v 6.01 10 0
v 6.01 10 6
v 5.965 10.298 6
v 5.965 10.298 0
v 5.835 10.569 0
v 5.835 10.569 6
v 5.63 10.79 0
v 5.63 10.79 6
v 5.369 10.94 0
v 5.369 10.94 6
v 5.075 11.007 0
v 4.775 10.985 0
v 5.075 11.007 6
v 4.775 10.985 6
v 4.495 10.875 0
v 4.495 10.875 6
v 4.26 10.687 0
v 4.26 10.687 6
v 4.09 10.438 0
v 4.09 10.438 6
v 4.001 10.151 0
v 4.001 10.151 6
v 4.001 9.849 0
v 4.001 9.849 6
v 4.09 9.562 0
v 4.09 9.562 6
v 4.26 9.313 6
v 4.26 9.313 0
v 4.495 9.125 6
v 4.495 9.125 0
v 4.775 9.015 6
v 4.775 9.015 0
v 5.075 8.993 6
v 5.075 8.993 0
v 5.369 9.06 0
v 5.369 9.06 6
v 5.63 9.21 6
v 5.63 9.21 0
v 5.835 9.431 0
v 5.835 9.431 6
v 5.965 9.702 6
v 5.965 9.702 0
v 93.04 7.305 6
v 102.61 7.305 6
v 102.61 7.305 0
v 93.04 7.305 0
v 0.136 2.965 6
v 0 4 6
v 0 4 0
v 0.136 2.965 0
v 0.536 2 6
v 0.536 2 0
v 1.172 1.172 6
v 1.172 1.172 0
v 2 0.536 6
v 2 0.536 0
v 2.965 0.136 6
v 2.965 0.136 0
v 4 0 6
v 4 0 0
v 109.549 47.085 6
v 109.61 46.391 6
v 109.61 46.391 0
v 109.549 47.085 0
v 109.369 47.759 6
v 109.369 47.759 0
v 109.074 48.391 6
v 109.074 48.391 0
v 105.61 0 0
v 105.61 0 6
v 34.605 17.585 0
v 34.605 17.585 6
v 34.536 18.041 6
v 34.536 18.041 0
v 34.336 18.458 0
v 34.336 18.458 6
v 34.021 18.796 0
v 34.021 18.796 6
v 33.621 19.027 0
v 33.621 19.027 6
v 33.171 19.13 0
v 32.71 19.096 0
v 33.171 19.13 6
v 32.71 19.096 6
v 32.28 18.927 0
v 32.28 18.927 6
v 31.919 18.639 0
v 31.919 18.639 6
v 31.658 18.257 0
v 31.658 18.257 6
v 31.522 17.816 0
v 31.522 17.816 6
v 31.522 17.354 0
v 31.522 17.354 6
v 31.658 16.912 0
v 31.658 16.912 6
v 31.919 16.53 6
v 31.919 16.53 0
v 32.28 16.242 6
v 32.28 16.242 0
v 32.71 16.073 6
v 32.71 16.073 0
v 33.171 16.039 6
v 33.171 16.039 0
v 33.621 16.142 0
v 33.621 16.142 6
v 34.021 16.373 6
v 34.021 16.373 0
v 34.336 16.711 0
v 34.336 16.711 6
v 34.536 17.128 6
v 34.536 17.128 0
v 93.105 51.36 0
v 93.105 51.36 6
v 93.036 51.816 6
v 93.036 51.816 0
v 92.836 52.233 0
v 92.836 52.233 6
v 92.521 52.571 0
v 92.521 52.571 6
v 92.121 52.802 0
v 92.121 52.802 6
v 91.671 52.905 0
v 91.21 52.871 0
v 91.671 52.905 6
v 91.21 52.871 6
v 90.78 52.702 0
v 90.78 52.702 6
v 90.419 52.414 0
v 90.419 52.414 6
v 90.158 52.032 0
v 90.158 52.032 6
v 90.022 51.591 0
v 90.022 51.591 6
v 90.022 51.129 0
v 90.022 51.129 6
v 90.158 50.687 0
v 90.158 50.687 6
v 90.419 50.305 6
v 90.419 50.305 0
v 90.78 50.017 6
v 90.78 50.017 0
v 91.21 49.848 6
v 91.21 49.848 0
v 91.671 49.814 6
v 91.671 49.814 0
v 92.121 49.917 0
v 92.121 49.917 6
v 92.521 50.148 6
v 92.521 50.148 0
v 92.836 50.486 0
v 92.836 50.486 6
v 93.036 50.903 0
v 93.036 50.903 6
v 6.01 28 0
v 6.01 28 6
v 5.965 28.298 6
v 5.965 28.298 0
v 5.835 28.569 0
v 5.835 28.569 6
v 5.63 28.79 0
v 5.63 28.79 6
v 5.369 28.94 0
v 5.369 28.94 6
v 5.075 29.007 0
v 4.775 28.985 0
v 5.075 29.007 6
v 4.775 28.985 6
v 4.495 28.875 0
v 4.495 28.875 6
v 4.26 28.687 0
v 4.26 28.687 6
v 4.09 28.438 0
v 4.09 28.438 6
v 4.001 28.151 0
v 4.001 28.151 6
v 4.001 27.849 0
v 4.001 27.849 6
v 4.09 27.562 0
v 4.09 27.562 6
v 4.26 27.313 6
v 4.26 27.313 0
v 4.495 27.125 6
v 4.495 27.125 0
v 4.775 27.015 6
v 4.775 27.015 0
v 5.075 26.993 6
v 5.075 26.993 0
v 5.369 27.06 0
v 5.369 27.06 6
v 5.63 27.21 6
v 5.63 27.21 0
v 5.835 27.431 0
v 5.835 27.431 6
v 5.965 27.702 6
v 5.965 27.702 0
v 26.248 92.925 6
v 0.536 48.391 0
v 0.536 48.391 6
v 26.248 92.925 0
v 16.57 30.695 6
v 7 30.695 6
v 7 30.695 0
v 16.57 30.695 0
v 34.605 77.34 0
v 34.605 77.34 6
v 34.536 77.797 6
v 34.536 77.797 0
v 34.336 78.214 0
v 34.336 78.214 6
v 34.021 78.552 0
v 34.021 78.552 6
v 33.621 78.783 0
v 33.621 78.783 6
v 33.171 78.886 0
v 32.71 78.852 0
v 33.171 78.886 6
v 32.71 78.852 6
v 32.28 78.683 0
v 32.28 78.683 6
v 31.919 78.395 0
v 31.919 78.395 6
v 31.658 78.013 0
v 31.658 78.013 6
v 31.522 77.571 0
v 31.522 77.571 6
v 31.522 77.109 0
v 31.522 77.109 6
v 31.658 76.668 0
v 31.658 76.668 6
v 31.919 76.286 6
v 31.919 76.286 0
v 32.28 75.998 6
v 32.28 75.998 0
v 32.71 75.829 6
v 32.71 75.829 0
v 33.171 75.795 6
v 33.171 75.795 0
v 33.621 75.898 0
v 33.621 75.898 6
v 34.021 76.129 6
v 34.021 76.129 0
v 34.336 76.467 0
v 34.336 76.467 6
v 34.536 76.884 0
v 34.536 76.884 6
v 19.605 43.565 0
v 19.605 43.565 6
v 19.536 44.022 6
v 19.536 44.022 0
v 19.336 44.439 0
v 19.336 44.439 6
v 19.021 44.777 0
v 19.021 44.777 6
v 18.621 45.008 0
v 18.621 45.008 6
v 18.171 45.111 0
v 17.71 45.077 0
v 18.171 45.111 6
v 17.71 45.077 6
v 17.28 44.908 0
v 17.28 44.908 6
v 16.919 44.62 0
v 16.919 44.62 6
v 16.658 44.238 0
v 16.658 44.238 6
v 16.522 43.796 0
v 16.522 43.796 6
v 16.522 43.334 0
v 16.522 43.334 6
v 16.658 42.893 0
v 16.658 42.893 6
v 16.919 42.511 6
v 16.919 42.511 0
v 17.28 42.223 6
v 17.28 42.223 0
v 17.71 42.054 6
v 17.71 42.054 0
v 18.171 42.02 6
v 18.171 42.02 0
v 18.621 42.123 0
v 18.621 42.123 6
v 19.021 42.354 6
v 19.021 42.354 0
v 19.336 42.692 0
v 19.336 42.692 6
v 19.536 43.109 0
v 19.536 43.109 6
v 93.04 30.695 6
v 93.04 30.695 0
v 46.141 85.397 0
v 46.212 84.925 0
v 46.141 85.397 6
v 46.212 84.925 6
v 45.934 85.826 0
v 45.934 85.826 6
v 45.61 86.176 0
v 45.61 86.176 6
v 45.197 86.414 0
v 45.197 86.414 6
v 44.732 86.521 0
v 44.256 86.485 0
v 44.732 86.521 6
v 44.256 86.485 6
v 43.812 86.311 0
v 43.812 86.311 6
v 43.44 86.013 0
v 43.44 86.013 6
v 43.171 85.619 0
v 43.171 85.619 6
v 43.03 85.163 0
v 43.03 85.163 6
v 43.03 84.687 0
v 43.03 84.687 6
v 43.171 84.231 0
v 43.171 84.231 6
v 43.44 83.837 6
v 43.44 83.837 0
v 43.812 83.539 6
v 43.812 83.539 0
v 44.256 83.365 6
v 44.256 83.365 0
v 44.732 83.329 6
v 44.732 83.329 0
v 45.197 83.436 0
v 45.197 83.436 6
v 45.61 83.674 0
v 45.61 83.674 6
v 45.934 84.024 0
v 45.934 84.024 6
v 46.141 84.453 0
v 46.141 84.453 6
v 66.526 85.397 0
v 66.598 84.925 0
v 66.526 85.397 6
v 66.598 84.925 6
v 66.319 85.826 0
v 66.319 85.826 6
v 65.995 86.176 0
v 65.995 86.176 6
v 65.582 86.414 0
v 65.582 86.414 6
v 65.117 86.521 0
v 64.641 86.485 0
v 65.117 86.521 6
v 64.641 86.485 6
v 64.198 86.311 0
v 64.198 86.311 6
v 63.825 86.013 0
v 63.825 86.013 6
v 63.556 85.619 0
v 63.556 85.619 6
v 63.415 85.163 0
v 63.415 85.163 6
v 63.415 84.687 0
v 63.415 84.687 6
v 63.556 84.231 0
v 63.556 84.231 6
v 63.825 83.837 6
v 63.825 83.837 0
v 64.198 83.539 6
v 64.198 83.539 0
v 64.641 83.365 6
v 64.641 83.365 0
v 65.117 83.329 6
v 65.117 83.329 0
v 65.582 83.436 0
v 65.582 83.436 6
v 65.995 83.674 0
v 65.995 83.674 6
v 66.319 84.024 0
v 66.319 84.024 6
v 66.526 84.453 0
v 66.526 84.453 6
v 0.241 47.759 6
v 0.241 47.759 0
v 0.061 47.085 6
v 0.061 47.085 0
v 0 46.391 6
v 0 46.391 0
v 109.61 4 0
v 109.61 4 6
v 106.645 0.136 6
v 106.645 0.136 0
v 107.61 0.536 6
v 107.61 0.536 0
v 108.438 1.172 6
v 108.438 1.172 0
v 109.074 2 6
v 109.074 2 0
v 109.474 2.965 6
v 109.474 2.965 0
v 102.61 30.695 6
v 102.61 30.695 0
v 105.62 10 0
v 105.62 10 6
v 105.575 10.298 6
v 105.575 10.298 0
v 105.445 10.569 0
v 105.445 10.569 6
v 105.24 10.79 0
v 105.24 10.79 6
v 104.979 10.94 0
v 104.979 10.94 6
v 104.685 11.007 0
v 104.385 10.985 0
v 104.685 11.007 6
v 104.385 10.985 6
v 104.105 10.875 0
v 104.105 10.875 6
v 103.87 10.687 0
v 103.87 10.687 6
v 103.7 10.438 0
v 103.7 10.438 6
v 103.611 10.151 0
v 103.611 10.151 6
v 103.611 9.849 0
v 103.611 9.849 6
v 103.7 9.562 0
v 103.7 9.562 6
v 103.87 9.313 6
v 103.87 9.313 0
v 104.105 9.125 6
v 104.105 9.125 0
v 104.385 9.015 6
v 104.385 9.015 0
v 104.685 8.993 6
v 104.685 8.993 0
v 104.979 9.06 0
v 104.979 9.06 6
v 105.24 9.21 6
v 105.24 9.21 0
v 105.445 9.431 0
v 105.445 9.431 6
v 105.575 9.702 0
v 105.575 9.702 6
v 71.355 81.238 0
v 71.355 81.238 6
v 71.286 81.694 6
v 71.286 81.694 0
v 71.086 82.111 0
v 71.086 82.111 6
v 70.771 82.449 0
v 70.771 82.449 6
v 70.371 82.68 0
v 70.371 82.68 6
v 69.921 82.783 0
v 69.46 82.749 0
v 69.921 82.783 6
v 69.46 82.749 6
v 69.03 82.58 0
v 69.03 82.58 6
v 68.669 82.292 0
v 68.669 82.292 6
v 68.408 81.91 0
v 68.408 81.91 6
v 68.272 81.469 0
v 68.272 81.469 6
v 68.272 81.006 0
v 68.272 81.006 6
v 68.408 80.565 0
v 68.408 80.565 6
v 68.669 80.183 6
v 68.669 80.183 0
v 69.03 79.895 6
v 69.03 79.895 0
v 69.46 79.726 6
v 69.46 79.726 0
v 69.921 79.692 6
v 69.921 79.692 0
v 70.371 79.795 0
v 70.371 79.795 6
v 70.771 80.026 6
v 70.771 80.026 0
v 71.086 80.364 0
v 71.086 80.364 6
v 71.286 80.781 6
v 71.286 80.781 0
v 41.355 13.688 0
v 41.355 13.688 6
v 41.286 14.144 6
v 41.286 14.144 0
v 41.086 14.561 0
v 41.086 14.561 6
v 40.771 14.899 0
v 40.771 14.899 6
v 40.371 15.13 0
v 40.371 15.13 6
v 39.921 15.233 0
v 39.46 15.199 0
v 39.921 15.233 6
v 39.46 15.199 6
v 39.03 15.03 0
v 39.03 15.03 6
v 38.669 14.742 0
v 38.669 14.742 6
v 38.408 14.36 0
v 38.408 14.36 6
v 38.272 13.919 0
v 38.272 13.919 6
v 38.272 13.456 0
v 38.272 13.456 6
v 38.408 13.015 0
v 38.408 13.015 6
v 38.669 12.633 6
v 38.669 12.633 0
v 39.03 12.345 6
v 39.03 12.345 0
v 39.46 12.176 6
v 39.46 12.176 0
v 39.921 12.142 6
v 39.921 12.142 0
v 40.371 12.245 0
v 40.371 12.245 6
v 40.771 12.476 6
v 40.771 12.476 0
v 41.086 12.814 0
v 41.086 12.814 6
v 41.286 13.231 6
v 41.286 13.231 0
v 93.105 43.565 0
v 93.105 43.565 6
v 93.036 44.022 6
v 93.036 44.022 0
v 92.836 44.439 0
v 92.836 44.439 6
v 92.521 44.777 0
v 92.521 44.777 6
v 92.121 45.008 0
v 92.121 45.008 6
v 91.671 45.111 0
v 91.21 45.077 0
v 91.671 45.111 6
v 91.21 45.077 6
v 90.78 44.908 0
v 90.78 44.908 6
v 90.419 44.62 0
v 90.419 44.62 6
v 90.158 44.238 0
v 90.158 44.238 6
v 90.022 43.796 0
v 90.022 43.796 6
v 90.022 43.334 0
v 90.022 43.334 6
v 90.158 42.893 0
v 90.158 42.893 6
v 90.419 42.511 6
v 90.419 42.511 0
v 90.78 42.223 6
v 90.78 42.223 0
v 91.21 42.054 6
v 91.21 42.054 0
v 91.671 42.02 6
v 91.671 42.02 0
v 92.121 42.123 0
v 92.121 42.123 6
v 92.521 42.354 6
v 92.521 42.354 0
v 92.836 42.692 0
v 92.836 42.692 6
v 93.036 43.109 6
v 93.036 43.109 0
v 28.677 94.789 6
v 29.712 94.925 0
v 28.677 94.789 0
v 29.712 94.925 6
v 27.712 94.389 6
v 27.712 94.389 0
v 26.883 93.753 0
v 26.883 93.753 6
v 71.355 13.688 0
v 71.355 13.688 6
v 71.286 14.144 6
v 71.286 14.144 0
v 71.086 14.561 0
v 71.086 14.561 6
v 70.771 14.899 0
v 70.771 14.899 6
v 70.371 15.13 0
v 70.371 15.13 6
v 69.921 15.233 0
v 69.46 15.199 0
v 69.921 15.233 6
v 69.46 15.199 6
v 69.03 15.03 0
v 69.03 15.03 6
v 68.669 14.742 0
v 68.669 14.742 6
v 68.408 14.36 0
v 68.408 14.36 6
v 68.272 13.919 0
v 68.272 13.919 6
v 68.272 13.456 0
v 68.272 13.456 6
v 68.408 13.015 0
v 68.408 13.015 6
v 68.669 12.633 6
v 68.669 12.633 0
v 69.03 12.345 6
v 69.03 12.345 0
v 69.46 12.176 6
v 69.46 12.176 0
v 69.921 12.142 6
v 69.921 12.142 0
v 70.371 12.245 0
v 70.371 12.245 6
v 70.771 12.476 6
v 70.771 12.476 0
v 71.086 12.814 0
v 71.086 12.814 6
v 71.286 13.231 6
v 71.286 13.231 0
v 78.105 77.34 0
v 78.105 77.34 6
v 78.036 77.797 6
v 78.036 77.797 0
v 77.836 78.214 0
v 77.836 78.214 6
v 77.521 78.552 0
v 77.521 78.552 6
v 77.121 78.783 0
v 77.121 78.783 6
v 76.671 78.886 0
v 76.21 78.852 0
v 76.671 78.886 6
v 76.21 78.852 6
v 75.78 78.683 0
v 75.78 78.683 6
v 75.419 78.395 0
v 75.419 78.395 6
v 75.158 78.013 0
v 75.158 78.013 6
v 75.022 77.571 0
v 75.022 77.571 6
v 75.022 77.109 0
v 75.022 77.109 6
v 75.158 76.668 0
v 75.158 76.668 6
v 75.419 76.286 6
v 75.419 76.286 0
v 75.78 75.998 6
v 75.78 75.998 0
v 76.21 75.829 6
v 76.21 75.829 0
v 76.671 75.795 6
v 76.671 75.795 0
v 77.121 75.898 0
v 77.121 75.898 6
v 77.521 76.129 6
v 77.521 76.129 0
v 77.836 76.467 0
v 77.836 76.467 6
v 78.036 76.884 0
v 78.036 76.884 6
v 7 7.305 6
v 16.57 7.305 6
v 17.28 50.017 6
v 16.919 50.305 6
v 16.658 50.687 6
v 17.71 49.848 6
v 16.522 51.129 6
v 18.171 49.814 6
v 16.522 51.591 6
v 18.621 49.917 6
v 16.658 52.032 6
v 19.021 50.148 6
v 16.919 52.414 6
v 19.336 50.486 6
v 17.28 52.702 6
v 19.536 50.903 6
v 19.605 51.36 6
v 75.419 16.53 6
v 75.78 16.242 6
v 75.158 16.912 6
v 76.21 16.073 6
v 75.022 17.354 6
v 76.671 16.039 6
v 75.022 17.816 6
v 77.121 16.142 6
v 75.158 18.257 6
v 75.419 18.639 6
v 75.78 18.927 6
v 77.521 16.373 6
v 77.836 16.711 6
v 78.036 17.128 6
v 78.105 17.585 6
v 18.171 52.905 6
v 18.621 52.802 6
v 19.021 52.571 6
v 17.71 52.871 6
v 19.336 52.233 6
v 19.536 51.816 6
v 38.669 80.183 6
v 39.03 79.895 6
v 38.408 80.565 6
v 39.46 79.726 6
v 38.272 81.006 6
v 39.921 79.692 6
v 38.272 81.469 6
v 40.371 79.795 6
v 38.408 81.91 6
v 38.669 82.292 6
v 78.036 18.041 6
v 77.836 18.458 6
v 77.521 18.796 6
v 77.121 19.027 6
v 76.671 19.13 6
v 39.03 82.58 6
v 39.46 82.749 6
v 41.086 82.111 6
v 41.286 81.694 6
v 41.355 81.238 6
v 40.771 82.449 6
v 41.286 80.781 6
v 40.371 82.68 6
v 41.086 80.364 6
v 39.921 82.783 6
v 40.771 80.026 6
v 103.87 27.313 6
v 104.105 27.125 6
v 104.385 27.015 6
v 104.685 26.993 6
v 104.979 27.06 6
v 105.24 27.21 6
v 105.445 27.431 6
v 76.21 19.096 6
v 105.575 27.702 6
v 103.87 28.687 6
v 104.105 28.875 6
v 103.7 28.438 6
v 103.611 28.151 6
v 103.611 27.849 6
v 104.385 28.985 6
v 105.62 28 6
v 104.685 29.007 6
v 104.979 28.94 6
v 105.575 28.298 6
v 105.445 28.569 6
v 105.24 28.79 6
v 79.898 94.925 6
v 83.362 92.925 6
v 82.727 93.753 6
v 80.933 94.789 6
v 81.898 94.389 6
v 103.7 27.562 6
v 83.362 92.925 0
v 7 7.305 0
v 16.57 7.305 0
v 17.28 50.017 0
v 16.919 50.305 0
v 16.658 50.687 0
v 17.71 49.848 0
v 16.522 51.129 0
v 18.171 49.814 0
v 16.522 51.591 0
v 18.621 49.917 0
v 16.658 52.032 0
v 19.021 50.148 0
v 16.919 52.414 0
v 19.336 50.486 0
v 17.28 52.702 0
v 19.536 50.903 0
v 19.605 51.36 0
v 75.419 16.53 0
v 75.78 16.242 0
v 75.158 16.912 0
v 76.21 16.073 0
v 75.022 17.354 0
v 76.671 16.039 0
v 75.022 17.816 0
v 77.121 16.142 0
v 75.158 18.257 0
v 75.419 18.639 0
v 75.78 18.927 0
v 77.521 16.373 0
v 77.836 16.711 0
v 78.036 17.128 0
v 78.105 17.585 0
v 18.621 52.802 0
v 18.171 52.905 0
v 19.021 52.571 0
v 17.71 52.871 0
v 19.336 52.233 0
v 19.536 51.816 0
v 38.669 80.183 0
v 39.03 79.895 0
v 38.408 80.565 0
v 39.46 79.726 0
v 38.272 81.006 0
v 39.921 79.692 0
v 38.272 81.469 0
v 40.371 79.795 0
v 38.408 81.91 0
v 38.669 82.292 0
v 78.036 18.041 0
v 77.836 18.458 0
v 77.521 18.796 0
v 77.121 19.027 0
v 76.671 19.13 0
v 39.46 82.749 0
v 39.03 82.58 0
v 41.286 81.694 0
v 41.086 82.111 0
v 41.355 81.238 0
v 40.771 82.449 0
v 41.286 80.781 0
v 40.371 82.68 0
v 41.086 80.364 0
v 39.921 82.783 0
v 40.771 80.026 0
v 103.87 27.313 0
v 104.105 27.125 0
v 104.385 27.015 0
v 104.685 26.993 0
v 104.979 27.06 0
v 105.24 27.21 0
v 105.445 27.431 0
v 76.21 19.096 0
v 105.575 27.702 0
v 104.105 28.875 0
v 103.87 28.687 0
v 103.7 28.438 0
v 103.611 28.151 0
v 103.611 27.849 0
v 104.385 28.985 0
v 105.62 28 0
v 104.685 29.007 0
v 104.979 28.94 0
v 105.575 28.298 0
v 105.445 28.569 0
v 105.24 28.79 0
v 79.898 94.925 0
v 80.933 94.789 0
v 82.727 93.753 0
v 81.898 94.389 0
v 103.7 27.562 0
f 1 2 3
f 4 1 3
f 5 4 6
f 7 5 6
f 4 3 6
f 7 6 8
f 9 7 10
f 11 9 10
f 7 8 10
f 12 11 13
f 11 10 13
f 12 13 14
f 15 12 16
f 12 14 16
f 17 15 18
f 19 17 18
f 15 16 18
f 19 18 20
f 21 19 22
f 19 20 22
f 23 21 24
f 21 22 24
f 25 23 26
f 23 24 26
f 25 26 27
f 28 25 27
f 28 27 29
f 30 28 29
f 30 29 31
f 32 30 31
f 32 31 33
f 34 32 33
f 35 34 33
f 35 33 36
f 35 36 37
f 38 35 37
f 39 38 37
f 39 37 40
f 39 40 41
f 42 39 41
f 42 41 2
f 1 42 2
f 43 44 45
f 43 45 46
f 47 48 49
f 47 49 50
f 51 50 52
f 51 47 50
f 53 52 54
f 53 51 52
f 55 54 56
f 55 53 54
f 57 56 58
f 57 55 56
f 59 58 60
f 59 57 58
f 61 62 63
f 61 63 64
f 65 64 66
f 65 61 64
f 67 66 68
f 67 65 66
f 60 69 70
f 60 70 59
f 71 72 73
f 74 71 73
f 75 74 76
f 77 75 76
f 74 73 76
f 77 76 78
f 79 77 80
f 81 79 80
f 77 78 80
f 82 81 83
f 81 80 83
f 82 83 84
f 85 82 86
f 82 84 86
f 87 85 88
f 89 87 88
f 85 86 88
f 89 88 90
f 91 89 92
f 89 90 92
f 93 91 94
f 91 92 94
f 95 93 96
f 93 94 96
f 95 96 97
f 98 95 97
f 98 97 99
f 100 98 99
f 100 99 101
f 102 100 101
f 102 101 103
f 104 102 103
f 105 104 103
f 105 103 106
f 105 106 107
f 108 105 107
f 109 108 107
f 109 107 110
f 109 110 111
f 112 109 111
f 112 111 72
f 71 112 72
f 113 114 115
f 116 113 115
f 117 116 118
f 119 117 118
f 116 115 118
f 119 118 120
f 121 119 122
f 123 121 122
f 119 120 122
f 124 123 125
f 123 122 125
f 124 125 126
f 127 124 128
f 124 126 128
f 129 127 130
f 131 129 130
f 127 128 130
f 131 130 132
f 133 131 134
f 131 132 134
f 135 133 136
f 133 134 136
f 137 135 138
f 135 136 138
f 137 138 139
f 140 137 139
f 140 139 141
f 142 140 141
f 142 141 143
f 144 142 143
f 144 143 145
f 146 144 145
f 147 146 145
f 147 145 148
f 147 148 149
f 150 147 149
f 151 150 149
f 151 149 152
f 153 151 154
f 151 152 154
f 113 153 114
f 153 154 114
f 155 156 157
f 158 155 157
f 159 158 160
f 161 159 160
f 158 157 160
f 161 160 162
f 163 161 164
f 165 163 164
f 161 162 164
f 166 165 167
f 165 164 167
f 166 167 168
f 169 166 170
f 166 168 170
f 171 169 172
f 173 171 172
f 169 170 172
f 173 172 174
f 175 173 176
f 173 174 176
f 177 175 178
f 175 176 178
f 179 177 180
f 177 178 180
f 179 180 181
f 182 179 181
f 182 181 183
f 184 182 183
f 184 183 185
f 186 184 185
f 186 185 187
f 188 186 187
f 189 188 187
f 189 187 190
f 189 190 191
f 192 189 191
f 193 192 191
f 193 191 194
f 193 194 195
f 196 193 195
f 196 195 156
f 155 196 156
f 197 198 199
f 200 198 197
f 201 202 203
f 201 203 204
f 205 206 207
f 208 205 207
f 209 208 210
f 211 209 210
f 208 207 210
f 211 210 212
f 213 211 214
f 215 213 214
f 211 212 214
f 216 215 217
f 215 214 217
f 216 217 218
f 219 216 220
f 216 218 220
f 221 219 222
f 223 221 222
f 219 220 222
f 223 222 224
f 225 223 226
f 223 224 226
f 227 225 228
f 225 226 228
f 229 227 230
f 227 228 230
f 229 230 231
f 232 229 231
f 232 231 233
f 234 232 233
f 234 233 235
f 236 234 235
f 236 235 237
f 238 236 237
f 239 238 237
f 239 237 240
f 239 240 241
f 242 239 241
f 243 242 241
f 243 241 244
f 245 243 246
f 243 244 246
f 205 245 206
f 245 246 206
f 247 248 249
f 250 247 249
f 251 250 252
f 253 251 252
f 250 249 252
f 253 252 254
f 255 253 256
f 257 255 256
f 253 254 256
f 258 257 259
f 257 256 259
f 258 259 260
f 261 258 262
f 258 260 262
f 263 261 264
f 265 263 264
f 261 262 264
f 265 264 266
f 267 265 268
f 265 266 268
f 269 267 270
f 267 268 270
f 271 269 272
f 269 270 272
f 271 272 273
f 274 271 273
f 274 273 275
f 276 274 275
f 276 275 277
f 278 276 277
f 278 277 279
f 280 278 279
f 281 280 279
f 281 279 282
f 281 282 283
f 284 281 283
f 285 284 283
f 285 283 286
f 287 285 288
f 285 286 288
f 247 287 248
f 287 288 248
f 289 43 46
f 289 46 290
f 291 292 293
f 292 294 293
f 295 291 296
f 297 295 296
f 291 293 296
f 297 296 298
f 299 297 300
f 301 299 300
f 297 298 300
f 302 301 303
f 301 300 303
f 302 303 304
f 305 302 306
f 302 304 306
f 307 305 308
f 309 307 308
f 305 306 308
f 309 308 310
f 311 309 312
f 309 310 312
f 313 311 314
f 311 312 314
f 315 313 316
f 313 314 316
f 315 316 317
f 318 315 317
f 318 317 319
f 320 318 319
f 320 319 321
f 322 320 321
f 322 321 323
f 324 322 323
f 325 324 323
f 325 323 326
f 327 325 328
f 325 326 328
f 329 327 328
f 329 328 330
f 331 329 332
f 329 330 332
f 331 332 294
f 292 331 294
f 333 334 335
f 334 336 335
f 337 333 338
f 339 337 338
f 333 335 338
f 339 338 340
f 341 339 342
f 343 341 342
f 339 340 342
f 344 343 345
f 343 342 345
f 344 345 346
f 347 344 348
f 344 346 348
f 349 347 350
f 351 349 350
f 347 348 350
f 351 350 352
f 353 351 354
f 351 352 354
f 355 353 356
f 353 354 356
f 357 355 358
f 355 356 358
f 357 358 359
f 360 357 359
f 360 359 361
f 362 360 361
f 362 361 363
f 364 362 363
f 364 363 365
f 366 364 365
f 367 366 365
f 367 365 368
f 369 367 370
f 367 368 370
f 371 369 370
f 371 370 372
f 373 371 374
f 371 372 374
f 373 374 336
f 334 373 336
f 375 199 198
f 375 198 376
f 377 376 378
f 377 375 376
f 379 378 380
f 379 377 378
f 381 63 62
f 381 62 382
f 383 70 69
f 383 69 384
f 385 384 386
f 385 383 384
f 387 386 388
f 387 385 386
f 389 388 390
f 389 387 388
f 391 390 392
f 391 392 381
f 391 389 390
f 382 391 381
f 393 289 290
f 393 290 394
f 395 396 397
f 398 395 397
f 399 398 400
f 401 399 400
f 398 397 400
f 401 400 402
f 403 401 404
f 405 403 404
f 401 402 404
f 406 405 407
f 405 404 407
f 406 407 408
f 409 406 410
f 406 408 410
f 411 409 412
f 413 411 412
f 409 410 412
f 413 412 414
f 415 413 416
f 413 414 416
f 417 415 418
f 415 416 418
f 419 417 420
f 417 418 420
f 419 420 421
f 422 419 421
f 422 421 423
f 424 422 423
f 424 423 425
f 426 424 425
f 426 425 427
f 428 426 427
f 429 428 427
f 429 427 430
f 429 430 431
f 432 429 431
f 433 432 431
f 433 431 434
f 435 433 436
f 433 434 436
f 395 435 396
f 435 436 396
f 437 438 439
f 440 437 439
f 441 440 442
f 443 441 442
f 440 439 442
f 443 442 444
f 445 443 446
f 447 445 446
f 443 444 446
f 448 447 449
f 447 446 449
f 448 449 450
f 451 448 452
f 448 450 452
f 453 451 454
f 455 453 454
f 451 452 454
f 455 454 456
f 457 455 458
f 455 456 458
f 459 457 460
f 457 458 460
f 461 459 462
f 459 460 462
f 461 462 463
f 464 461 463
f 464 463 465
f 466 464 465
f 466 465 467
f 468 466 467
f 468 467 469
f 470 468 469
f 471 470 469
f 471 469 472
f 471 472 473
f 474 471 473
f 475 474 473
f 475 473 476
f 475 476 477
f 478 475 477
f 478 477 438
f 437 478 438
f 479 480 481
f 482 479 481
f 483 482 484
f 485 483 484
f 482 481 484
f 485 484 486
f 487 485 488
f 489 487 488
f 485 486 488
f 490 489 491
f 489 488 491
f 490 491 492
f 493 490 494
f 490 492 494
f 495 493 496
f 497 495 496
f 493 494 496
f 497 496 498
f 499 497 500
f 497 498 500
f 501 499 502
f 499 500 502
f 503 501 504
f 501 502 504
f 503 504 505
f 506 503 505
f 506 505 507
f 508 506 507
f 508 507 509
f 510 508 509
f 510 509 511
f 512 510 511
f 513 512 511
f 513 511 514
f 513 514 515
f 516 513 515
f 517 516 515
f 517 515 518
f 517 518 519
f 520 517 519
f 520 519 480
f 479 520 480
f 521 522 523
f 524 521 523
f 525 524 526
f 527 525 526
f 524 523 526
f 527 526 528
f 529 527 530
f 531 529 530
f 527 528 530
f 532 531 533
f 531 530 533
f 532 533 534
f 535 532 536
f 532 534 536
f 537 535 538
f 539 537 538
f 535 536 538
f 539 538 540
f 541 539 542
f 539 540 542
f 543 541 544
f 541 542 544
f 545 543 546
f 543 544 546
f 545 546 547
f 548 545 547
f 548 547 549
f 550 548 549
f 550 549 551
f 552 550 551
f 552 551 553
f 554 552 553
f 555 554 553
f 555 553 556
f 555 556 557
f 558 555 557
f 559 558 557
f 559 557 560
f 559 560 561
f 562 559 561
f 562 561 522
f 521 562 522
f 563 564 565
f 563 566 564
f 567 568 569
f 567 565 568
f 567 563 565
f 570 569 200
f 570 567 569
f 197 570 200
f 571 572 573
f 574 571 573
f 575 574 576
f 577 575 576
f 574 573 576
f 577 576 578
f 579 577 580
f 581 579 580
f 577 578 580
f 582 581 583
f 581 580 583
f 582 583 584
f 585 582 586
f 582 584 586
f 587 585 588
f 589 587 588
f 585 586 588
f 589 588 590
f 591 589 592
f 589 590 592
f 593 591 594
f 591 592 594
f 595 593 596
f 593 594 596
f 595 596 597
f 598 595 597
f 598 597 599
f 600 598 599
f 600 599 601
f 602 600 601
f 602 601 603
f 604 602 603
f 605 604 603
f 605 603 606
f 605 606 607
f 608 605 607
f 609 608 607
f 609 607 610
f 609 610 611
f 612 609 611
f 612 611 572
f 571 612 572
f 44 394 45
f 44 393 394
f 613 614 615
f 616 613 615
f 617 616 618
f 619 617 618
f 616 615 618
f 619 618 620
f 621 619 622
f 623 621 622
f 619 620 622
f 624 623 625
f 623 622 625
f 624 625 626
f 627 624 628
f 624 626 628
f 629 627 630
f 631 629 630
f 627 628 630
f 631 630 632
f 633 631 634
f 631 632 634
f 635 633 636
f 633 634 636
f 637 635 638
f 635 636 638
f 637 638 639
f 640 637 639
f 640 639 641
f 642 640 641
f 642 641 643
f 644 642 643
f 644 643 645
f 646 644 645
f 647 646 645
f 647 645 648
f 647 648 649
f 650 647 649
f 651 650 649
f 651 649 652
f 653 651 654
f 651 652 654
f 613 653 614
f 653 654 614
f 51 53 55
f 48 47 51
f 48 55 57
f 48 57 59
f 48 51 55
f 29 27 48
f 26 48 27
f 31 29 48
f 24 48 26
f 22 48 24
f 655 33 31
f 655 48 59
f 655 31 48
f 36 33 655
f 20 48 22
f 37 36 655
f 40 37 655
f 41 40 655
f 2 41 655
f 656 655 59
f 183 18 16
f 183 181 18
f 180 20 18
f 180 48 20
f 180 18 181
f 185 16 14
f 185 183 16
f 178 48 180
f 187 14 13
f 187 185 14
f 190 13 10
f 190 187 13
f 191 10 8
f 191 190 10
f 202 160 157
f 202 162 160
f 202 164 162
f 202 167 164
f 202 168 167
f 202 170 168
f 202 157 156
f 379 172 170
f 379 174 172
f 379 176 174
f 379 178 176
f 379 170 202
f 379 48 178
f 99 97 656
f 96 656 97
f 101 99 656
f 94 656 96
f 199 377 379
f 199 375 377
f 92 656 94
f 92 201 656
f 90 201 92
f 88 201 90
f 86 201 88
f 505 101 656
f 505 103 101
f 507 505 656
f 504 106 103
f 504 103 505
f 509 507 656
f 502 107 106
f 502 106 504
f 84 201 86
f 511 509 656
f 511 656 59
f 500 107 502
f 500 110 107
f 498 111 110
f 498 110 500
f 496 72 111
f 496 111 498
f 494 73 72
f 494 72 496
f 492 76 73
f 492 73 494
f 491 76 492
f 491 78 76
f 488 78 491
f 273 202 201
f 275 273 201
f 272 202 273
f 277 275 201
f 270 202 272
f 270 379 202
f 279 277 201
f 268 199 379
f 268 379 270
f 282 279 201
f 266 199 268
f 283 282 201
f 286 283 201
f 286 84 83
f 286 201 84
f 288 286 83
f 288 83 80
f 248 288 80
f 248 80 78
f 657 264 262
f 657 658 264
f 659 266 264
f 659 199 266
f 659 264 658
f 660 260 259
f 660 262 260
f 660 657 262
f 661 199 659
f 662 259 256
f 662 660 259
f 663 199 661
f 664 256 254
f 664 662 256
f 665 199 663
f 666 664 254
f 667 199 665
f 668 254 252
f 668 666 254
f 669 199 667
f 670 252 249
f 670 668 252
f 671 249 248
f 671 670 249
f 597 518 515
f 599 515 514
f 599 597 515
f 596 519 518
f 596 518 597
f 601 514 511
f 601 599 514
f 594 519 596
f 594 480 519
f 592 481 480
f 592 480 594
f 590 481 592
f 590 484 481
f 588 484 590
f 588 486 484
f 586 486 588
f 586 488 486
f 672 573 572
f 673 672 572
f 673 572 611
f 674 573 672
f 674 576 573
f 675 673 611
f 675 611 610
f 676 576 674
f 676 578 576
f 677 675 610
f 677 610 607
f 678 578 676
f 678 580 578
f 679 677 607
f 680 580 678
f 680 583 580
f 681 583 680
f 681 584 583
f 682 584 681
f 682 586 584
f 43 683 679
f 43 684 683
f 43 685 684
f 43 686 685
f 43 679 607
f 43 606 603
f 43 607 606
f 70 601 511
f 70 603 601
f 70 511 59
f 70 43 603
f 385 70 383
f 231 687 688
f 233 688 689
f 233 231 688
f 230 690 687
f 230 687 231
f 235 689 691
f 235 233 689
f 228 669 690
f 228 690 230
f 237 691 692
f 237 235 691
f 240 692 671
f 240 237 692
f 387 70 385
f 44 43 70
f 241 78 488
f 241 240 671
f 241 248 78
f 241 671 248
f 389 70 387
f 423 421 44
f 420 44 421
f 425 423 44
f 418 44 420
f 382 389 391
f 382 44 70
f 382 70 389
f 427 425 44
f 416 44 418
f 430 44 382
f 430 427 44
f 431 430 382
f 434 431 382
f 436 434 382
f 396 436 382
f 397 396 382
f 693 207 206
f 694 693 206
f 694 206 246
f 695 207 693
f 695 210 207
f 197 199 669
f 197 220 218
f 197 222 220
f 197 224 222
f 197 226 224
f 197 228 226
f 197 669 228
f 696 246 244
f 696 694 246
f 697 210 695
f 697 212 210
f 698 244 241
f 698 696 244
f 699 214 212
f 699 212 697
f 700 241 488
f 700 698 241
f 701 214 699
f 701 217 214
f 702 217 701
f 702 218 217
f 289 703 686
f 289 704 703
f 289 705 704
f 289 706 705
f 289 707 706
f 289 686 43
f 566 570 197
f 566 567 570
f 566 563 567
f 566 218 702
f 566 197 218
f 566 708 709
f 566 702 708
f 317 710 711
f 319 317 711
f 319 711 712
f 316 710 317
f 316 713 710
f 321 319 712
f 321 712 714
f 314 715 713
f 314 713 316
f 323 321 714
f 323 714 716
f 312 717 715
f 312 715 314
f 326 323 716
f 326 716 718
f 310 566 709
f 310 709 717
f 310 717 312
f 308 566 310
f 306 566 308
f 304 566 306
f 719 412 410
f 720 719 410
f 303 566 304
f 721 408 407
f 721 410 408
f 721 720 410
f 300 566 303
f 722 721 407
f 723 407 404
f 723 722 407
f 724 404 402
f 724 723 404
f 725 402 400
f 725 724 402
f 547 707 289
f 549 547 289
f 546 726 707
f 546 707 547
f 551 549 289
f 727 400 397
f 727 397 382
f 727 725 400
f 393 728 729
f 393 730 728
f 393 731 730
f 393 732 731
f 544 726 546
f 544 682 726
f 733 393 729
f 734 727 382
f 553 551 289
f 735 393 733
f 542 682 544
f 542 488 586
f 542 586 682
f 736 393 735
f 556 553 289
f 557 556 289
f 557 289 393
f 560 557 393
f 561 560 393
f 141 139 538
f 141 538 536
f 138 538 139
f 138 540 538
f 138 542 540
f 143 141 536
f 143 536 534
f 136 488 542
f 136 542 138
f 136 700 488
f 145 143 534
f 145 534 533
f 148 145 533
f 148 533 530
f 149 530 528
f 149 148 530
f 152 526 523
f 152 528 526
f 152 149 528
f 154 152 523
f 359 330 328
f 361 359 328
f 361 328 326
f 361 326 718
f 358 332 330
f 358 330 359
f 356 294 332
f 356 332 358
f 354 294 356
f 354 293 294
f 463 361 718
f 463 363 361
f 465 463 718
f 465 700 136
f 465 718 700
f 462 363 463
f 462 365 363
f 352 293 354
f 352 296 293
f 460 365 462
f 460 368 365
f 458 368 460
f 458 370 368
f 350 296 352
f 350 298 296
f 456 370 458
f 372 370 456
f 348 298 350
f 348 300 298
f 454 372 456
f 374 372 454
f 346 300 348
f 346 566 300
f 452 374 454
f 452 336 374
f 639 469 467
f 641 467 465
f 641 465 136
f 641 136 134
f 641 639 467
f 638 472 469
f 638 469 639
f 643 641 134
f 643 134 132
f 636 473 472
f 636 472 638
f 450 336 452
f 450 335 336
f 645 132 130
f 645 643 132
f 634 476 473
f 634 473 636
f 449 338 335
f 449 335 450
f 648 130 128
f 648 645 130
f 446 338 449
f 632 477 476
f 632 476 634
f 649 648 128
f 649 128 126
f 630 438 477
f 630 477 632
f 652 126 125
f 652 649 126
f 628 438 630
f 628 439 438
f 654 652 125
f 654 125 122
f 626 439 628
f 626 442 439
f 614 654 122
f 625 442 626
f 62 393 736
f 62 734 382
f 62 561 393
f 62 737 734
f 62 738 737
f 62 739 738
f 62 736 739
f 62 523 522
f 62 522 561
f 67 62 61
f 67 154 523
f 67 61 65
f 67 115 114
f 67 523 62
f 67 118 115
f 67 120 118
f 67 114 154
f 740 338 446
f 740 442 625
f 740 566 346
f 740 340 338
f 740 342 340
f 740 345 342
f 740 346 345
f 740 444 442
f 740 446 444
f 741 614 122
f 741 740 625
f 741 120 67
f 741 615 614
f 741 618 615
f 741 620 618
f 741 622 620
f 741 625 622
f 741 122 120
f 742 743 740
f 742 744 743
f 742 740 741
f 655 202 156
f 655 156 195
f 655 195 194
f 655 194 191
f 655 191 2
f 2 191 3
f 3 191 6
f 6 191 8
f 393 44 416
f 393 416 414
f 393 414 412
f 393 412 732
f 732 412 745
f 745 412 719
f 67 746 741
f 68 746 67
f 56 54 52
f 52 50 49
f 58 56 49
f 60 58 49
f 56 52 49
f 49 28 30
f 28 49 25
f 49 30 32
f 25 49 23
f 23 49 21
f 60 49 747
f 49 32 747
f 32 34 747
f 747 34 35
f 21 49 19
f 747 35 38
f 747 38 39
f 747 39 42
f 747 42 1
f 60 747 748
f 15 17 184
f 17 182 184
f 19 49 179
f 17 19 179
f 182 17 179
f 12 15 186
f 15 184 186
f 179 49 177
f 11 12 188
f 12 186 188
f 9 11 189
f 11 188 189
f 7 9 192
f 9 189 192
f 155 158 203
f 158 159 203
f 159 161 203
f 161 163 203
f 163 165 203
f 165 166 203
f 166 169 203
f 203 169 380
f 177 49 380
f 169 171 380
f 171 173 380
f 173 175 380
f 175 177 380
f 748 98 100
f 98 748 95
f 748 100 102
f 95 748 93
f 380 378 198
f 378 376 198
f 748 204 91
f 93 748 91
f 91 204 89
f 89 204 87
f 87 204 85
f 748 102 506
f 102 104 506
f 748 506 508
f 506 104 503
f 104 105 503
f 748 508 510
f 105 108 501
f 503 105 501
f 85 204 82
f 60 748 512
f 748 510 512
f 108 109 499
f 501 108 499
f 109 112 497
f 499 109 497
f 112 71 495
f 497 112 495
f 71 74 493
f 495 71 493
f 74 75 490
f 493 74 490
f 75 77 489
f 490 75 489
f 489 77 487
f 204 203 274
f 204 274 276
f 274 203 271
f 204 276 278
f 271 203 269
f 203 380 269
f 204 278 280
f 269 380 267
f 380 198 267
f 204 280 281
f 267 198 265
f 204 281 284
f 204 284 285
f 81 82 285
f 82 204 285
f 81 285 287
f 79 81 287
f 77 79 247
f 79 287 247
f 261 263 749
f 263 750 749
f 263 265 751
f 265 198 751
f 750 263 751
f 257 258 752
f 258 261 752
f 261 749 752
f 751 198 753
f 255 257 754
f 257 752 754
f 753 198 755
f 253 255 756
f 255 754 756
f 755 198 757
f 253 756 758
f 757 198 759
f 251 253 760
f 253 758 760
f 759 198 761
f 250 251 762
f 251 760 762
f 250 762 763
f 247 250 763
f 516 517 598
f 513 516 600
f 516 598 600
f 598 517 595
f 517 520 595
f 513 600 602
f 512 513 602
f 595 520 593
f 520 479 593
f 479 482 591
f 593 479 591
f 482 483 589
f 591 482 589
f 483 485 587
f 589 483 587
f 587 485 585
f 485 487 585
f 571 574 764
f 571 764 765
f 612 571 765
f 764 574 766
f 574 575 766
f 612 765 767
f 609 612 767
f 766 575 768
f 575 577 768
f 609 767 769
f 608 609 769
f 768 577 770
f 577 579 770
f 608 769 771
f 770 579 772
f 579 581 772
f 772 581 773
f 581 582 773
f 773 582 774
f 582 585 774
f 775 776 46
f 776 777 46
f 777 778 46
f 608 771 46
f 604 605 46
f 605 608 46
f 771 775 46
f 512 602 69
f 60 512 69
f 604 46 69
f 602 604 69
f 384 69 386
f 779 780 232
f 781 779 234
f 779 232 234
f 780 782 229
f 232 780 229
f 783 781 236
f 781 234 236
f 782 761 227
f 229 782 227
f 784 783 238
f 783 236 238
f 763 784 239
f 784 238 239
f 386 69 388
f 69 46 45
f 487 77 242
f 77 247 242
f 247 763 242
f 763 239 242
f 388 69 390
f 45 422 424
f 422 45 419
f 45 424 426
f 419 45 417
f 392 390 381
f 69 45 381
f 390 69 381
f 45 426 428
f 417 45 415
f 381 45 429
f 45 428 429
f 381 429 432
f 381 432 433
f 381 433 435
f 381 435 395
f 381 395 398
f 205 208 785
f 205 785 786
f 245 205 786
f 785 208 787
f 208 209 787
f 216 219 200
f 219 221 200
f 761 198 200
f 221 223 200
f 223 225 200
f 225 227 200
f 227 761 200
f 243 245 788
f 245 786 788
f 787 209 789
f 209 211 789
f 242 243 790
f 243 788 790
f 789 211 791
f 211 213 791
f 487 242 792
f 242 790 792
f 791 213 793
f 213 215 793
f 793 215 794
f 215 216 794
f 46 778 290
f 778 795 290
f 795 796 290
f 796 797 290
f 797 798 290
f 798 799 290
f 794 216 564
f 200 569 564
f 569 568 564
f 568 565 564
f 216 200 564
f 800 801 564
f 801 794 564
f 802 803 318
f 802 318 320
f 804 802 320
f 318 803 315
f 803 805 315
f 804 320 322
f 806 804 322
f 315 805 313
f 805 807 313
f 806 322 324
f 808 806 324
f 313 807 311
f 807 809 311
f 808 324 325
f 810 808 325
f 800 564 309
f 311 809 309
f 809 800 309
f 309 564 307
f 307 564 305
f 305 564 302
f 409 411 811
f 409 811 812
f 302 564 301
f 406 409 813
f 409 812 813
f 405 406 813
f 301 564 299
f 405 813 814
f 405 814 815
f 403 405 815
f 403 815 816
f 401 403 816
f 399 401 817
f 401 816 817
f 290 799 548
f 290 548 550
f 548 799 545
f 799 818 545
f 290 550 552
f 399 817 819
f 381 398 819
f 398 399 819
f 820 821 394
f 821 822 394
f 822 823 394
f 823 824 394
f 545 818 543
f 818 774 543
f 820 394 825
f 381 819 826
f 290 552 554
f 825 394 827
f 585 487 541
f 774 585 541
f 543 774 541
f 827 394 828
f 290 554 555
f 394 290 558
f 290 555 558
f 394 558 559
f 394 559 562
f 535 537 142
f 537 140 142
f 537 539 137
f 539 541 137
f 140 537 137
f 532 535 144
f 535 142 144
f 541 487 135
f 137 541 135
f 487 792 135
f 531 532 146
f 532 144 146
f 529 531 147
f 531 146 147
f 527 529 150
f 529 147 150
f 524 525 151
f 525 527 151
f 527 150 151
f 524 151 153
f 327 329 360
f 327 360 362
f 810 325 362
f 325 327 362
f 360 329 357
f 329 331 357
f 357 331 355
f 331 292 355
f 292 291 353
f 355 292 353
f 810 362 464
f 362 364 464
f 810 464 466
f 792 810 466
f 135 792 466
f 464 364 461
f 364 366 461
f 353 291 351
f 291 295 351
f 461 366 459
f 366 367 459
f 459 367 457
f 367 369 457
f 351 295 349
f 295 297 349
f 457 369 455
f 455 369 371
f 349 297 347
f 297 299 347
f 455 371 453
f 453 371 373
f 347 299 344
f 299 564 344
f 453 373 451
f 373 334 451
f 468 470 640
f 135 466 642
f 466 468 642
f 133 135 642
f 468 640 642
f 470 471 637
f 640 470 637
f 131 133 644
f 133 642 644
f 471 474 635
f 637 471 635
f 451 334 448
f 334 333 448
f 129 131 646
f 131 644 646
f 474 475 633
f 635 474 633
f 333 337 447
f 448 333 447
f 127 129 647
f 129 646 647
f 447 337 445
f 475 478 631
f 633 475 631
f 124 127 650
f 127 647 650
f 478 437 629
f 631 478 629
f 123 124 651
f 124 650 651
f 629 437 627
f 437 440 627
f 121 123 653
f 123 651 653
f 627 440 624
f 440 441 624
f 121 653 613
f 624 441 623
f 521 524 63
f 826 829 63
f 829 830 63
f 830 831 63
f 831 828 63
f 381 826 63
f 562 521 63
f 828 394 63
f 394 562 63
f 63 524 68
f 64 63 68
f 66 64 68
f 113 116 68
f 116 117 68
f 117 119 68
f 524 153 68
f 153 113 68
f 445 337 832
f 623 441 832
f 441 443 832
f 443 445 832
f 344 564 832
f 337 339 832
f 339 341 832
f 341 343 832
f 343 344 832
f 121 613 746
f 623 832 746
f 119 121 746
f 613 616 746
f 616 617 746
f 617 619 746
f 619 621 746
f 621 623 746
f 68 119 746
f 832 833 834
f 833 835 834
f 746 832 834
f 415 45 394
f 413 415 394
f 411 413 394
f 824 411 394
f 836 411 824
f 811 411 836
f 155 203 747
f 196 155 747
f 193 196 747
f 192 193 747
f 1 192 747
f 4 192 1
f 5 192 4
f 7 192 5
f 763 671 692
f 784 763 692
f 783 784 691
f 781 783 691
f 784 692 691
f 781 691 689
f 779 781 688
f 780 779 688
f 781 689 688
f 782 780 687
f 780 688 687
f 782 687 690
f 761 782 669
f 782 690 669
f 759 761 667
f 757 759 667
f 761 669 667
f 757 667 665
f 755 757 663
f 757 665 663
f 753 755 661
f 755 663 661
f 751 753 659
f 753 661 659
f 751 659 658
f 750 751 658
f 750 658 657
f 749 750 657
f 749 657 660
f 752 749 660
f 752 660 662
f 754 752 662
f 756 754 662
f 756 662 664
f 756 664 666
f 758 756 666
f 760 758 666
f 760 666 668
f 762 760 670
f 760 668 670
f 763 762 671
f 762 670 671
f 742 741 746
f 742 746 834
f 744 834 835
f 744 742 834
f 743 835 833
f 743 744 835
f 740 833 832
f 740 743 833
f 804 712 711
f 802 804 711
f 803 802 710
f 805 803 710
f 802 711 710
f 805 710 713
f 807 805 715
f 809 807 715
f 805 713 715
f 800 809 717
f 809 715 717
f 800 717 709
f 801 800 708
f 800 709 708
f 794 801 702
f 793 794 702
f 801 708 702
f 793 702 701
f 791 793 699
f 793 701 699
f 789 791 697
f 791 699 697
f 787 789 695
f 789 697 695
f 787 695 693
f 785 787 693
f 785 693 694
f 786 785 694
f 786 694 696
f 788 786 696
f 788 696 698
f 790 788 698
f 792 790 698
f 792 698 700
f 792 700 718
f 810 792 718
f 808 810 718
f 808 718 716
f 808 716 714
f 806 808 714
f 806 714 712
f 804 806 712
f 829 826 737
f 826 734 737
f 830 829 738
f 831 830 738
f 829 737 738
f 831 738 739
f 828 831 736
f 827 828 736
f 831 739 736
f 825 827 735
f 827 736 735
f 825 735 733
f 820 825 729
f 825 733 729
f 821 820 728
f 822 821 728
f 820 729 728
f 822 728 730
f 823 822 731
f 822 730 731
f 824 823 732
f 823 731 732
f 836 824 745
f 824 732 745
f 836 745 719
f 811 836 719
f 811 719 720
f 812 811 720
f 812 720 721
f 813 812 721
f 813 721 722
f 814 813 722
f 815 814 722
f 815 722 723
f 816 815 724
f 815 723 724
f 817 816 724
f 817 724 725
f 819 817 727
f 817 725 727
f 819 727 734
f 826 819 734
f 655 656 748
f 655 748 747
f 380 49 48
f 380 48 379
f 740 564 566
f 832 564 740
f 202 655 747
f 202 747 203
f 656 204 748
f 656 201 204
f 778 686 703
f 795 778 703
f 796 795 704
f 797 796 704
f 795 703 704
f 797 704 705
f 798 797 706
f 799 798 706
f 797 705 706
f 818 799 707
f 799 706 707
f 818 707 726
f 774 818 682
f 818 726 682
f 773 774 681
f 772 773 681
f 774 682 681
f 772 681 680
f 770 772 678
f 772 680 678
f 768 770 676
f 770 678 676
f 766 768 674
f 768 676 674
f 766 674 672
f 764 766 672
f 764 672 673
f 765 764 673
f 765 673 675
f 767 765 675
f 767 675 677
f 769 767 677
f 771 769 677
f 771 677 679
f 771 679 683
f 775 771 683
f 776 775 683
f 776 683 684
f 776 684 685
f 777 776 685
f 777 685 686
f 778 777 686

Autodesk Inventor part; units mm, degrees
ref_plane "YZ Plane" through (0, 0, 0) normal (1, 0, 0) x (0, 1, 0)
ref_plane "XZ Plane" through (0, 0, 0) normal (0, 1, 0) x (-1, 0, 0)
ref_plane "XY Plane" through (0, 0, 0) normal (0, 0, 1) x (1, 0, 0)
sketch "Sketch1" plane through (0, 0, 0) normal (0, 0, 1) x (1, 0, 0)
  line L0 (0, 0) -> (0, 47.4625)
  line L1 (0, 47.4625) -> (27.4025, 94.925)
  line L2 (27.4025, 94.925) -> (82.2075, 94.925)
  line L3 (82.2075, 94.925) -> (109.61, 47.4625)
  line L4 (109.61, 47.4625) -> (109.61, 0)
  line L5 (109.61, 0) -> (0, 0)
  dimension "d2" = 54.805
  dimension "d3" = 120
  dimension "d4" = 120
  dimension "d5" = 47.4625
  dimension "d6" = 47.4625
extrude "Extrusion1" add sketch "Sketch1" along normal blind 6
sketch "Sketch2" plane through (0, 0, 6) normal (0, 0, 1) x (1, 0, 0)
  line L0 (0, 47.4625) -> (0, 0) projected
  line L1 (0, 0) -> (109.61, 0) projected
  line L2 (109.61, 0) -> (109.61, 47.4625) projected
  line L3 (109.61, 47.4625) -> (82.2075, 94.925) projected
  line L4 (82.2075, 94.925) -> (27.4025, 94.925) projected
  line L5 (27.4025, 94.925) -> (0, 47.4625) projected
  circle A0 centre (5, 28) radius 1.01
  circle A1 centre (5, 10) radius 1.01
  circle A2 centre (104.61, 28) radius 1.01
  circle A3 centre (104.61, 10) radius 1.01
  circle A4 centre (44.6125, 84.925) radius 1.6
  circle A5 centre (64.9975, 84.925) radius 1.6
  line L6 (7, 30.695) -> (16.57, 30.695)
  line L7 (16.57, 30.695) -> (16.57, 7.305)
  line L8 (16.57, 7.305) -> (7, 7.305)
  line L9 (7, 7.305) -> (7, 30.695)
  line L10 (93.04, 30.695) -> (102.61, 30.695)
  line L11 (102.61, 30.695) -> (102.61, 7.305)
  line L12 (102.61, 7.305) -> (93.04, 7.305)
  line L13 (93.04, 7.305) -> (93.04, 30.695)
  line L14 (82.2075, 94.925) -> (27.4025, 94.925) construction
  line L15 (54.805, 94.925) -> (54.805, 91.0637) construction
  line L16 (5, 28) -> (5, 10) construction
  line L17 (5, 19) -> (11.5154, 19) construction
  dimension "d10" = 2.02
  dimension "d11" = 3.2
  dimension "d12" = 5
  dimension "d13" = 5
  dimension "d14" = 18
  dimension "d15" = 10
  dimension "d16" = 23.39
  dimension "d17" = 9.57
  dimension "d19" = 2
  dimension "d20" = 2
  dimension "d21" = 20.385
  dimension "d22" = 10
  dimension "d23" = 3.8614
extrude "Extrusion2" cut sketch "Sketch2" against normal through all contours A0 | A1 | A2 | A3 | A4 | A5 | L6 L7 L8 L9 | L10 L11 L12 L13
sketch "Sketch3" plane through (0, 0, 6) normal (0, 0, 1) x (1, 0, 0)
  line L0 (7, 7.305) -> (7, 30.695) projected
  line L1 (7, 30.695) -> (16.57, 30.695) projected
  line L2 (16.57, 30.695) -> (16.57, 7.305) projected
  line L3 (16.57, 7.305) -> (7, 7.305) projected
  circle A0 centre (44.6125, 84.925) radius 1.6 projected
  circle A1 centre (104.61, 28) radius 1.01 projected
  circle A2 centre (5, 28) radius 1.01 projected
  circle A3 centre (5, 10) radius 1.01 projected
  circle A4 centre (104.61, 10) radius 1.01 projected
  circle A5 centre (64.9975, 84.925) radius 1.6 projected
  line L4 (93.04, 7.305) -> (93.04, 30.695) projected
  line L5 (93.04, 30.695) -> (102.61, 30.695) projected
  line L6 (102.61, 30.695) -> (102.61, 7.305) projected
  line L7 (102.61, 7.305) -> (93.04, 7.305) projected
  line L8 (0, 47.4625) -> (0, 0) projected
  line L9 (0, 0) -> (109.61, 0) projected
  line L10 (109.61, 0) -> (109.61, 47.4625) projected
  line L11 (109.61, 47.4625) -> (82.2075, 94.925) projected
  line L12 (82.2075, 94.925) -> (27.4025, 94.925) projected
  line L13 (27.4025, 94.925) -> (0, 47.4625) projected
  line L14 (82.2075, 94.925) -> (109.61, 47.4625)
  line L15 (109.61, 47.4625) -> (82.2075, 0)
  line L16 (82.2075, 0) -> (27.4025, 0)
  line L17 (27.4025, 0) -> (0, 47.4625)
  line L18 (0, 47.4625) -> (27.4025, 94.925)
  line L19 (27.4025, 94.925) -> (82.2075, 94.925)
  circle A6 centre (33.055, 77.3404) radius 1.55
  circle A7 centre (39.805, 81.2375) radius 1.55
  circle A8 centre (69.805, 81.2375) radius 1.55
  circle A9 centre (18.055, 51.3596) radius 1.55
  circle A10 centre (18.055, 43.5654) radius 1.55
  circle A11 centre (33.055, 17.5846) radius 1.55
  circle A12 centre (39.805, 13.6875) radius 1.55
  circle A13 centre (69.805, 13.6875) radius 1.55
  circle A14 centre (76.555, 17.5846) radius 1.55
  circle A15 centre (91.555, 43.5654) radius 1.55
  circle A16 centre (91.555, 51.3596) radius 1.55
  line L20 (74.305, 81.2375) -> (93.805, 47.4625) construction
  line L21 (93.805, 47.4625) -> (74.305, 13.6875) construction
  line L22 (74.305, 13.6875) -> (35.305, 13.6875) construction
  line L23 (35.305, 13.6875) -> (15.805, 47.4625) construction
  line L24 (15.805, 47.4625) -> (35.305, 81.2375) construction
  line L25 (35.305, 81.2375) -> (74.305, 81.2375) construction
  circle A17 centre (76.555, 77.3404) radius 1.55
  point P0 (54.805, 47.4625)
  point P1 (54.805, 47.4625)
  dimension "d26" = 3.1
  dimension "d27" = 39
  dimension "d28" = 4.5
  dimension "d29" = 4.5
  dimension "d30" = 4.5
  dimension "d31" = 4.5
  dimension "d32" = 4.5
  dimension "d33" = 4.5
  dimension "d34" = 4.5
  dimension "d35" = 4.5
  dimension "d36" = 4.5
  dimension "d37" = 4.5
  dimension "d40" = 59.7557
extrude "Extrusion3" cut sketch "Sketch3" against normal through all contours A6 | A7 | A8 | A9 | A10 | A11 | A12 | A13 | A14 | A15 | A16 | A17
fillet "Fillet1" radius 4 6 edges at (109.61, 0, 3) (109.61, 47.4625, 3) (82.2075, 94.925, 3) (27.4025, 94.925, 3) (0, 47.4625, 3) (0, 0, 3)
equation "\"d4\" = d3"
equation "\"d6\" = d5"
equation "\"d13\" = d12"
equation "\"d20\" = d19"
equation "\"d29\" = d28"
equation "\"d30\" = d28"
equation "\"d31\" = d29"
equation "\"d32\" = d28"
equation "\"d33\" = d28"
equation "\"d34\" = d28"
equation "\"d35\" = d28"
equation "\"d36\" = d28"
equation "\"d37\" = d30"
properties part number "megapr"
